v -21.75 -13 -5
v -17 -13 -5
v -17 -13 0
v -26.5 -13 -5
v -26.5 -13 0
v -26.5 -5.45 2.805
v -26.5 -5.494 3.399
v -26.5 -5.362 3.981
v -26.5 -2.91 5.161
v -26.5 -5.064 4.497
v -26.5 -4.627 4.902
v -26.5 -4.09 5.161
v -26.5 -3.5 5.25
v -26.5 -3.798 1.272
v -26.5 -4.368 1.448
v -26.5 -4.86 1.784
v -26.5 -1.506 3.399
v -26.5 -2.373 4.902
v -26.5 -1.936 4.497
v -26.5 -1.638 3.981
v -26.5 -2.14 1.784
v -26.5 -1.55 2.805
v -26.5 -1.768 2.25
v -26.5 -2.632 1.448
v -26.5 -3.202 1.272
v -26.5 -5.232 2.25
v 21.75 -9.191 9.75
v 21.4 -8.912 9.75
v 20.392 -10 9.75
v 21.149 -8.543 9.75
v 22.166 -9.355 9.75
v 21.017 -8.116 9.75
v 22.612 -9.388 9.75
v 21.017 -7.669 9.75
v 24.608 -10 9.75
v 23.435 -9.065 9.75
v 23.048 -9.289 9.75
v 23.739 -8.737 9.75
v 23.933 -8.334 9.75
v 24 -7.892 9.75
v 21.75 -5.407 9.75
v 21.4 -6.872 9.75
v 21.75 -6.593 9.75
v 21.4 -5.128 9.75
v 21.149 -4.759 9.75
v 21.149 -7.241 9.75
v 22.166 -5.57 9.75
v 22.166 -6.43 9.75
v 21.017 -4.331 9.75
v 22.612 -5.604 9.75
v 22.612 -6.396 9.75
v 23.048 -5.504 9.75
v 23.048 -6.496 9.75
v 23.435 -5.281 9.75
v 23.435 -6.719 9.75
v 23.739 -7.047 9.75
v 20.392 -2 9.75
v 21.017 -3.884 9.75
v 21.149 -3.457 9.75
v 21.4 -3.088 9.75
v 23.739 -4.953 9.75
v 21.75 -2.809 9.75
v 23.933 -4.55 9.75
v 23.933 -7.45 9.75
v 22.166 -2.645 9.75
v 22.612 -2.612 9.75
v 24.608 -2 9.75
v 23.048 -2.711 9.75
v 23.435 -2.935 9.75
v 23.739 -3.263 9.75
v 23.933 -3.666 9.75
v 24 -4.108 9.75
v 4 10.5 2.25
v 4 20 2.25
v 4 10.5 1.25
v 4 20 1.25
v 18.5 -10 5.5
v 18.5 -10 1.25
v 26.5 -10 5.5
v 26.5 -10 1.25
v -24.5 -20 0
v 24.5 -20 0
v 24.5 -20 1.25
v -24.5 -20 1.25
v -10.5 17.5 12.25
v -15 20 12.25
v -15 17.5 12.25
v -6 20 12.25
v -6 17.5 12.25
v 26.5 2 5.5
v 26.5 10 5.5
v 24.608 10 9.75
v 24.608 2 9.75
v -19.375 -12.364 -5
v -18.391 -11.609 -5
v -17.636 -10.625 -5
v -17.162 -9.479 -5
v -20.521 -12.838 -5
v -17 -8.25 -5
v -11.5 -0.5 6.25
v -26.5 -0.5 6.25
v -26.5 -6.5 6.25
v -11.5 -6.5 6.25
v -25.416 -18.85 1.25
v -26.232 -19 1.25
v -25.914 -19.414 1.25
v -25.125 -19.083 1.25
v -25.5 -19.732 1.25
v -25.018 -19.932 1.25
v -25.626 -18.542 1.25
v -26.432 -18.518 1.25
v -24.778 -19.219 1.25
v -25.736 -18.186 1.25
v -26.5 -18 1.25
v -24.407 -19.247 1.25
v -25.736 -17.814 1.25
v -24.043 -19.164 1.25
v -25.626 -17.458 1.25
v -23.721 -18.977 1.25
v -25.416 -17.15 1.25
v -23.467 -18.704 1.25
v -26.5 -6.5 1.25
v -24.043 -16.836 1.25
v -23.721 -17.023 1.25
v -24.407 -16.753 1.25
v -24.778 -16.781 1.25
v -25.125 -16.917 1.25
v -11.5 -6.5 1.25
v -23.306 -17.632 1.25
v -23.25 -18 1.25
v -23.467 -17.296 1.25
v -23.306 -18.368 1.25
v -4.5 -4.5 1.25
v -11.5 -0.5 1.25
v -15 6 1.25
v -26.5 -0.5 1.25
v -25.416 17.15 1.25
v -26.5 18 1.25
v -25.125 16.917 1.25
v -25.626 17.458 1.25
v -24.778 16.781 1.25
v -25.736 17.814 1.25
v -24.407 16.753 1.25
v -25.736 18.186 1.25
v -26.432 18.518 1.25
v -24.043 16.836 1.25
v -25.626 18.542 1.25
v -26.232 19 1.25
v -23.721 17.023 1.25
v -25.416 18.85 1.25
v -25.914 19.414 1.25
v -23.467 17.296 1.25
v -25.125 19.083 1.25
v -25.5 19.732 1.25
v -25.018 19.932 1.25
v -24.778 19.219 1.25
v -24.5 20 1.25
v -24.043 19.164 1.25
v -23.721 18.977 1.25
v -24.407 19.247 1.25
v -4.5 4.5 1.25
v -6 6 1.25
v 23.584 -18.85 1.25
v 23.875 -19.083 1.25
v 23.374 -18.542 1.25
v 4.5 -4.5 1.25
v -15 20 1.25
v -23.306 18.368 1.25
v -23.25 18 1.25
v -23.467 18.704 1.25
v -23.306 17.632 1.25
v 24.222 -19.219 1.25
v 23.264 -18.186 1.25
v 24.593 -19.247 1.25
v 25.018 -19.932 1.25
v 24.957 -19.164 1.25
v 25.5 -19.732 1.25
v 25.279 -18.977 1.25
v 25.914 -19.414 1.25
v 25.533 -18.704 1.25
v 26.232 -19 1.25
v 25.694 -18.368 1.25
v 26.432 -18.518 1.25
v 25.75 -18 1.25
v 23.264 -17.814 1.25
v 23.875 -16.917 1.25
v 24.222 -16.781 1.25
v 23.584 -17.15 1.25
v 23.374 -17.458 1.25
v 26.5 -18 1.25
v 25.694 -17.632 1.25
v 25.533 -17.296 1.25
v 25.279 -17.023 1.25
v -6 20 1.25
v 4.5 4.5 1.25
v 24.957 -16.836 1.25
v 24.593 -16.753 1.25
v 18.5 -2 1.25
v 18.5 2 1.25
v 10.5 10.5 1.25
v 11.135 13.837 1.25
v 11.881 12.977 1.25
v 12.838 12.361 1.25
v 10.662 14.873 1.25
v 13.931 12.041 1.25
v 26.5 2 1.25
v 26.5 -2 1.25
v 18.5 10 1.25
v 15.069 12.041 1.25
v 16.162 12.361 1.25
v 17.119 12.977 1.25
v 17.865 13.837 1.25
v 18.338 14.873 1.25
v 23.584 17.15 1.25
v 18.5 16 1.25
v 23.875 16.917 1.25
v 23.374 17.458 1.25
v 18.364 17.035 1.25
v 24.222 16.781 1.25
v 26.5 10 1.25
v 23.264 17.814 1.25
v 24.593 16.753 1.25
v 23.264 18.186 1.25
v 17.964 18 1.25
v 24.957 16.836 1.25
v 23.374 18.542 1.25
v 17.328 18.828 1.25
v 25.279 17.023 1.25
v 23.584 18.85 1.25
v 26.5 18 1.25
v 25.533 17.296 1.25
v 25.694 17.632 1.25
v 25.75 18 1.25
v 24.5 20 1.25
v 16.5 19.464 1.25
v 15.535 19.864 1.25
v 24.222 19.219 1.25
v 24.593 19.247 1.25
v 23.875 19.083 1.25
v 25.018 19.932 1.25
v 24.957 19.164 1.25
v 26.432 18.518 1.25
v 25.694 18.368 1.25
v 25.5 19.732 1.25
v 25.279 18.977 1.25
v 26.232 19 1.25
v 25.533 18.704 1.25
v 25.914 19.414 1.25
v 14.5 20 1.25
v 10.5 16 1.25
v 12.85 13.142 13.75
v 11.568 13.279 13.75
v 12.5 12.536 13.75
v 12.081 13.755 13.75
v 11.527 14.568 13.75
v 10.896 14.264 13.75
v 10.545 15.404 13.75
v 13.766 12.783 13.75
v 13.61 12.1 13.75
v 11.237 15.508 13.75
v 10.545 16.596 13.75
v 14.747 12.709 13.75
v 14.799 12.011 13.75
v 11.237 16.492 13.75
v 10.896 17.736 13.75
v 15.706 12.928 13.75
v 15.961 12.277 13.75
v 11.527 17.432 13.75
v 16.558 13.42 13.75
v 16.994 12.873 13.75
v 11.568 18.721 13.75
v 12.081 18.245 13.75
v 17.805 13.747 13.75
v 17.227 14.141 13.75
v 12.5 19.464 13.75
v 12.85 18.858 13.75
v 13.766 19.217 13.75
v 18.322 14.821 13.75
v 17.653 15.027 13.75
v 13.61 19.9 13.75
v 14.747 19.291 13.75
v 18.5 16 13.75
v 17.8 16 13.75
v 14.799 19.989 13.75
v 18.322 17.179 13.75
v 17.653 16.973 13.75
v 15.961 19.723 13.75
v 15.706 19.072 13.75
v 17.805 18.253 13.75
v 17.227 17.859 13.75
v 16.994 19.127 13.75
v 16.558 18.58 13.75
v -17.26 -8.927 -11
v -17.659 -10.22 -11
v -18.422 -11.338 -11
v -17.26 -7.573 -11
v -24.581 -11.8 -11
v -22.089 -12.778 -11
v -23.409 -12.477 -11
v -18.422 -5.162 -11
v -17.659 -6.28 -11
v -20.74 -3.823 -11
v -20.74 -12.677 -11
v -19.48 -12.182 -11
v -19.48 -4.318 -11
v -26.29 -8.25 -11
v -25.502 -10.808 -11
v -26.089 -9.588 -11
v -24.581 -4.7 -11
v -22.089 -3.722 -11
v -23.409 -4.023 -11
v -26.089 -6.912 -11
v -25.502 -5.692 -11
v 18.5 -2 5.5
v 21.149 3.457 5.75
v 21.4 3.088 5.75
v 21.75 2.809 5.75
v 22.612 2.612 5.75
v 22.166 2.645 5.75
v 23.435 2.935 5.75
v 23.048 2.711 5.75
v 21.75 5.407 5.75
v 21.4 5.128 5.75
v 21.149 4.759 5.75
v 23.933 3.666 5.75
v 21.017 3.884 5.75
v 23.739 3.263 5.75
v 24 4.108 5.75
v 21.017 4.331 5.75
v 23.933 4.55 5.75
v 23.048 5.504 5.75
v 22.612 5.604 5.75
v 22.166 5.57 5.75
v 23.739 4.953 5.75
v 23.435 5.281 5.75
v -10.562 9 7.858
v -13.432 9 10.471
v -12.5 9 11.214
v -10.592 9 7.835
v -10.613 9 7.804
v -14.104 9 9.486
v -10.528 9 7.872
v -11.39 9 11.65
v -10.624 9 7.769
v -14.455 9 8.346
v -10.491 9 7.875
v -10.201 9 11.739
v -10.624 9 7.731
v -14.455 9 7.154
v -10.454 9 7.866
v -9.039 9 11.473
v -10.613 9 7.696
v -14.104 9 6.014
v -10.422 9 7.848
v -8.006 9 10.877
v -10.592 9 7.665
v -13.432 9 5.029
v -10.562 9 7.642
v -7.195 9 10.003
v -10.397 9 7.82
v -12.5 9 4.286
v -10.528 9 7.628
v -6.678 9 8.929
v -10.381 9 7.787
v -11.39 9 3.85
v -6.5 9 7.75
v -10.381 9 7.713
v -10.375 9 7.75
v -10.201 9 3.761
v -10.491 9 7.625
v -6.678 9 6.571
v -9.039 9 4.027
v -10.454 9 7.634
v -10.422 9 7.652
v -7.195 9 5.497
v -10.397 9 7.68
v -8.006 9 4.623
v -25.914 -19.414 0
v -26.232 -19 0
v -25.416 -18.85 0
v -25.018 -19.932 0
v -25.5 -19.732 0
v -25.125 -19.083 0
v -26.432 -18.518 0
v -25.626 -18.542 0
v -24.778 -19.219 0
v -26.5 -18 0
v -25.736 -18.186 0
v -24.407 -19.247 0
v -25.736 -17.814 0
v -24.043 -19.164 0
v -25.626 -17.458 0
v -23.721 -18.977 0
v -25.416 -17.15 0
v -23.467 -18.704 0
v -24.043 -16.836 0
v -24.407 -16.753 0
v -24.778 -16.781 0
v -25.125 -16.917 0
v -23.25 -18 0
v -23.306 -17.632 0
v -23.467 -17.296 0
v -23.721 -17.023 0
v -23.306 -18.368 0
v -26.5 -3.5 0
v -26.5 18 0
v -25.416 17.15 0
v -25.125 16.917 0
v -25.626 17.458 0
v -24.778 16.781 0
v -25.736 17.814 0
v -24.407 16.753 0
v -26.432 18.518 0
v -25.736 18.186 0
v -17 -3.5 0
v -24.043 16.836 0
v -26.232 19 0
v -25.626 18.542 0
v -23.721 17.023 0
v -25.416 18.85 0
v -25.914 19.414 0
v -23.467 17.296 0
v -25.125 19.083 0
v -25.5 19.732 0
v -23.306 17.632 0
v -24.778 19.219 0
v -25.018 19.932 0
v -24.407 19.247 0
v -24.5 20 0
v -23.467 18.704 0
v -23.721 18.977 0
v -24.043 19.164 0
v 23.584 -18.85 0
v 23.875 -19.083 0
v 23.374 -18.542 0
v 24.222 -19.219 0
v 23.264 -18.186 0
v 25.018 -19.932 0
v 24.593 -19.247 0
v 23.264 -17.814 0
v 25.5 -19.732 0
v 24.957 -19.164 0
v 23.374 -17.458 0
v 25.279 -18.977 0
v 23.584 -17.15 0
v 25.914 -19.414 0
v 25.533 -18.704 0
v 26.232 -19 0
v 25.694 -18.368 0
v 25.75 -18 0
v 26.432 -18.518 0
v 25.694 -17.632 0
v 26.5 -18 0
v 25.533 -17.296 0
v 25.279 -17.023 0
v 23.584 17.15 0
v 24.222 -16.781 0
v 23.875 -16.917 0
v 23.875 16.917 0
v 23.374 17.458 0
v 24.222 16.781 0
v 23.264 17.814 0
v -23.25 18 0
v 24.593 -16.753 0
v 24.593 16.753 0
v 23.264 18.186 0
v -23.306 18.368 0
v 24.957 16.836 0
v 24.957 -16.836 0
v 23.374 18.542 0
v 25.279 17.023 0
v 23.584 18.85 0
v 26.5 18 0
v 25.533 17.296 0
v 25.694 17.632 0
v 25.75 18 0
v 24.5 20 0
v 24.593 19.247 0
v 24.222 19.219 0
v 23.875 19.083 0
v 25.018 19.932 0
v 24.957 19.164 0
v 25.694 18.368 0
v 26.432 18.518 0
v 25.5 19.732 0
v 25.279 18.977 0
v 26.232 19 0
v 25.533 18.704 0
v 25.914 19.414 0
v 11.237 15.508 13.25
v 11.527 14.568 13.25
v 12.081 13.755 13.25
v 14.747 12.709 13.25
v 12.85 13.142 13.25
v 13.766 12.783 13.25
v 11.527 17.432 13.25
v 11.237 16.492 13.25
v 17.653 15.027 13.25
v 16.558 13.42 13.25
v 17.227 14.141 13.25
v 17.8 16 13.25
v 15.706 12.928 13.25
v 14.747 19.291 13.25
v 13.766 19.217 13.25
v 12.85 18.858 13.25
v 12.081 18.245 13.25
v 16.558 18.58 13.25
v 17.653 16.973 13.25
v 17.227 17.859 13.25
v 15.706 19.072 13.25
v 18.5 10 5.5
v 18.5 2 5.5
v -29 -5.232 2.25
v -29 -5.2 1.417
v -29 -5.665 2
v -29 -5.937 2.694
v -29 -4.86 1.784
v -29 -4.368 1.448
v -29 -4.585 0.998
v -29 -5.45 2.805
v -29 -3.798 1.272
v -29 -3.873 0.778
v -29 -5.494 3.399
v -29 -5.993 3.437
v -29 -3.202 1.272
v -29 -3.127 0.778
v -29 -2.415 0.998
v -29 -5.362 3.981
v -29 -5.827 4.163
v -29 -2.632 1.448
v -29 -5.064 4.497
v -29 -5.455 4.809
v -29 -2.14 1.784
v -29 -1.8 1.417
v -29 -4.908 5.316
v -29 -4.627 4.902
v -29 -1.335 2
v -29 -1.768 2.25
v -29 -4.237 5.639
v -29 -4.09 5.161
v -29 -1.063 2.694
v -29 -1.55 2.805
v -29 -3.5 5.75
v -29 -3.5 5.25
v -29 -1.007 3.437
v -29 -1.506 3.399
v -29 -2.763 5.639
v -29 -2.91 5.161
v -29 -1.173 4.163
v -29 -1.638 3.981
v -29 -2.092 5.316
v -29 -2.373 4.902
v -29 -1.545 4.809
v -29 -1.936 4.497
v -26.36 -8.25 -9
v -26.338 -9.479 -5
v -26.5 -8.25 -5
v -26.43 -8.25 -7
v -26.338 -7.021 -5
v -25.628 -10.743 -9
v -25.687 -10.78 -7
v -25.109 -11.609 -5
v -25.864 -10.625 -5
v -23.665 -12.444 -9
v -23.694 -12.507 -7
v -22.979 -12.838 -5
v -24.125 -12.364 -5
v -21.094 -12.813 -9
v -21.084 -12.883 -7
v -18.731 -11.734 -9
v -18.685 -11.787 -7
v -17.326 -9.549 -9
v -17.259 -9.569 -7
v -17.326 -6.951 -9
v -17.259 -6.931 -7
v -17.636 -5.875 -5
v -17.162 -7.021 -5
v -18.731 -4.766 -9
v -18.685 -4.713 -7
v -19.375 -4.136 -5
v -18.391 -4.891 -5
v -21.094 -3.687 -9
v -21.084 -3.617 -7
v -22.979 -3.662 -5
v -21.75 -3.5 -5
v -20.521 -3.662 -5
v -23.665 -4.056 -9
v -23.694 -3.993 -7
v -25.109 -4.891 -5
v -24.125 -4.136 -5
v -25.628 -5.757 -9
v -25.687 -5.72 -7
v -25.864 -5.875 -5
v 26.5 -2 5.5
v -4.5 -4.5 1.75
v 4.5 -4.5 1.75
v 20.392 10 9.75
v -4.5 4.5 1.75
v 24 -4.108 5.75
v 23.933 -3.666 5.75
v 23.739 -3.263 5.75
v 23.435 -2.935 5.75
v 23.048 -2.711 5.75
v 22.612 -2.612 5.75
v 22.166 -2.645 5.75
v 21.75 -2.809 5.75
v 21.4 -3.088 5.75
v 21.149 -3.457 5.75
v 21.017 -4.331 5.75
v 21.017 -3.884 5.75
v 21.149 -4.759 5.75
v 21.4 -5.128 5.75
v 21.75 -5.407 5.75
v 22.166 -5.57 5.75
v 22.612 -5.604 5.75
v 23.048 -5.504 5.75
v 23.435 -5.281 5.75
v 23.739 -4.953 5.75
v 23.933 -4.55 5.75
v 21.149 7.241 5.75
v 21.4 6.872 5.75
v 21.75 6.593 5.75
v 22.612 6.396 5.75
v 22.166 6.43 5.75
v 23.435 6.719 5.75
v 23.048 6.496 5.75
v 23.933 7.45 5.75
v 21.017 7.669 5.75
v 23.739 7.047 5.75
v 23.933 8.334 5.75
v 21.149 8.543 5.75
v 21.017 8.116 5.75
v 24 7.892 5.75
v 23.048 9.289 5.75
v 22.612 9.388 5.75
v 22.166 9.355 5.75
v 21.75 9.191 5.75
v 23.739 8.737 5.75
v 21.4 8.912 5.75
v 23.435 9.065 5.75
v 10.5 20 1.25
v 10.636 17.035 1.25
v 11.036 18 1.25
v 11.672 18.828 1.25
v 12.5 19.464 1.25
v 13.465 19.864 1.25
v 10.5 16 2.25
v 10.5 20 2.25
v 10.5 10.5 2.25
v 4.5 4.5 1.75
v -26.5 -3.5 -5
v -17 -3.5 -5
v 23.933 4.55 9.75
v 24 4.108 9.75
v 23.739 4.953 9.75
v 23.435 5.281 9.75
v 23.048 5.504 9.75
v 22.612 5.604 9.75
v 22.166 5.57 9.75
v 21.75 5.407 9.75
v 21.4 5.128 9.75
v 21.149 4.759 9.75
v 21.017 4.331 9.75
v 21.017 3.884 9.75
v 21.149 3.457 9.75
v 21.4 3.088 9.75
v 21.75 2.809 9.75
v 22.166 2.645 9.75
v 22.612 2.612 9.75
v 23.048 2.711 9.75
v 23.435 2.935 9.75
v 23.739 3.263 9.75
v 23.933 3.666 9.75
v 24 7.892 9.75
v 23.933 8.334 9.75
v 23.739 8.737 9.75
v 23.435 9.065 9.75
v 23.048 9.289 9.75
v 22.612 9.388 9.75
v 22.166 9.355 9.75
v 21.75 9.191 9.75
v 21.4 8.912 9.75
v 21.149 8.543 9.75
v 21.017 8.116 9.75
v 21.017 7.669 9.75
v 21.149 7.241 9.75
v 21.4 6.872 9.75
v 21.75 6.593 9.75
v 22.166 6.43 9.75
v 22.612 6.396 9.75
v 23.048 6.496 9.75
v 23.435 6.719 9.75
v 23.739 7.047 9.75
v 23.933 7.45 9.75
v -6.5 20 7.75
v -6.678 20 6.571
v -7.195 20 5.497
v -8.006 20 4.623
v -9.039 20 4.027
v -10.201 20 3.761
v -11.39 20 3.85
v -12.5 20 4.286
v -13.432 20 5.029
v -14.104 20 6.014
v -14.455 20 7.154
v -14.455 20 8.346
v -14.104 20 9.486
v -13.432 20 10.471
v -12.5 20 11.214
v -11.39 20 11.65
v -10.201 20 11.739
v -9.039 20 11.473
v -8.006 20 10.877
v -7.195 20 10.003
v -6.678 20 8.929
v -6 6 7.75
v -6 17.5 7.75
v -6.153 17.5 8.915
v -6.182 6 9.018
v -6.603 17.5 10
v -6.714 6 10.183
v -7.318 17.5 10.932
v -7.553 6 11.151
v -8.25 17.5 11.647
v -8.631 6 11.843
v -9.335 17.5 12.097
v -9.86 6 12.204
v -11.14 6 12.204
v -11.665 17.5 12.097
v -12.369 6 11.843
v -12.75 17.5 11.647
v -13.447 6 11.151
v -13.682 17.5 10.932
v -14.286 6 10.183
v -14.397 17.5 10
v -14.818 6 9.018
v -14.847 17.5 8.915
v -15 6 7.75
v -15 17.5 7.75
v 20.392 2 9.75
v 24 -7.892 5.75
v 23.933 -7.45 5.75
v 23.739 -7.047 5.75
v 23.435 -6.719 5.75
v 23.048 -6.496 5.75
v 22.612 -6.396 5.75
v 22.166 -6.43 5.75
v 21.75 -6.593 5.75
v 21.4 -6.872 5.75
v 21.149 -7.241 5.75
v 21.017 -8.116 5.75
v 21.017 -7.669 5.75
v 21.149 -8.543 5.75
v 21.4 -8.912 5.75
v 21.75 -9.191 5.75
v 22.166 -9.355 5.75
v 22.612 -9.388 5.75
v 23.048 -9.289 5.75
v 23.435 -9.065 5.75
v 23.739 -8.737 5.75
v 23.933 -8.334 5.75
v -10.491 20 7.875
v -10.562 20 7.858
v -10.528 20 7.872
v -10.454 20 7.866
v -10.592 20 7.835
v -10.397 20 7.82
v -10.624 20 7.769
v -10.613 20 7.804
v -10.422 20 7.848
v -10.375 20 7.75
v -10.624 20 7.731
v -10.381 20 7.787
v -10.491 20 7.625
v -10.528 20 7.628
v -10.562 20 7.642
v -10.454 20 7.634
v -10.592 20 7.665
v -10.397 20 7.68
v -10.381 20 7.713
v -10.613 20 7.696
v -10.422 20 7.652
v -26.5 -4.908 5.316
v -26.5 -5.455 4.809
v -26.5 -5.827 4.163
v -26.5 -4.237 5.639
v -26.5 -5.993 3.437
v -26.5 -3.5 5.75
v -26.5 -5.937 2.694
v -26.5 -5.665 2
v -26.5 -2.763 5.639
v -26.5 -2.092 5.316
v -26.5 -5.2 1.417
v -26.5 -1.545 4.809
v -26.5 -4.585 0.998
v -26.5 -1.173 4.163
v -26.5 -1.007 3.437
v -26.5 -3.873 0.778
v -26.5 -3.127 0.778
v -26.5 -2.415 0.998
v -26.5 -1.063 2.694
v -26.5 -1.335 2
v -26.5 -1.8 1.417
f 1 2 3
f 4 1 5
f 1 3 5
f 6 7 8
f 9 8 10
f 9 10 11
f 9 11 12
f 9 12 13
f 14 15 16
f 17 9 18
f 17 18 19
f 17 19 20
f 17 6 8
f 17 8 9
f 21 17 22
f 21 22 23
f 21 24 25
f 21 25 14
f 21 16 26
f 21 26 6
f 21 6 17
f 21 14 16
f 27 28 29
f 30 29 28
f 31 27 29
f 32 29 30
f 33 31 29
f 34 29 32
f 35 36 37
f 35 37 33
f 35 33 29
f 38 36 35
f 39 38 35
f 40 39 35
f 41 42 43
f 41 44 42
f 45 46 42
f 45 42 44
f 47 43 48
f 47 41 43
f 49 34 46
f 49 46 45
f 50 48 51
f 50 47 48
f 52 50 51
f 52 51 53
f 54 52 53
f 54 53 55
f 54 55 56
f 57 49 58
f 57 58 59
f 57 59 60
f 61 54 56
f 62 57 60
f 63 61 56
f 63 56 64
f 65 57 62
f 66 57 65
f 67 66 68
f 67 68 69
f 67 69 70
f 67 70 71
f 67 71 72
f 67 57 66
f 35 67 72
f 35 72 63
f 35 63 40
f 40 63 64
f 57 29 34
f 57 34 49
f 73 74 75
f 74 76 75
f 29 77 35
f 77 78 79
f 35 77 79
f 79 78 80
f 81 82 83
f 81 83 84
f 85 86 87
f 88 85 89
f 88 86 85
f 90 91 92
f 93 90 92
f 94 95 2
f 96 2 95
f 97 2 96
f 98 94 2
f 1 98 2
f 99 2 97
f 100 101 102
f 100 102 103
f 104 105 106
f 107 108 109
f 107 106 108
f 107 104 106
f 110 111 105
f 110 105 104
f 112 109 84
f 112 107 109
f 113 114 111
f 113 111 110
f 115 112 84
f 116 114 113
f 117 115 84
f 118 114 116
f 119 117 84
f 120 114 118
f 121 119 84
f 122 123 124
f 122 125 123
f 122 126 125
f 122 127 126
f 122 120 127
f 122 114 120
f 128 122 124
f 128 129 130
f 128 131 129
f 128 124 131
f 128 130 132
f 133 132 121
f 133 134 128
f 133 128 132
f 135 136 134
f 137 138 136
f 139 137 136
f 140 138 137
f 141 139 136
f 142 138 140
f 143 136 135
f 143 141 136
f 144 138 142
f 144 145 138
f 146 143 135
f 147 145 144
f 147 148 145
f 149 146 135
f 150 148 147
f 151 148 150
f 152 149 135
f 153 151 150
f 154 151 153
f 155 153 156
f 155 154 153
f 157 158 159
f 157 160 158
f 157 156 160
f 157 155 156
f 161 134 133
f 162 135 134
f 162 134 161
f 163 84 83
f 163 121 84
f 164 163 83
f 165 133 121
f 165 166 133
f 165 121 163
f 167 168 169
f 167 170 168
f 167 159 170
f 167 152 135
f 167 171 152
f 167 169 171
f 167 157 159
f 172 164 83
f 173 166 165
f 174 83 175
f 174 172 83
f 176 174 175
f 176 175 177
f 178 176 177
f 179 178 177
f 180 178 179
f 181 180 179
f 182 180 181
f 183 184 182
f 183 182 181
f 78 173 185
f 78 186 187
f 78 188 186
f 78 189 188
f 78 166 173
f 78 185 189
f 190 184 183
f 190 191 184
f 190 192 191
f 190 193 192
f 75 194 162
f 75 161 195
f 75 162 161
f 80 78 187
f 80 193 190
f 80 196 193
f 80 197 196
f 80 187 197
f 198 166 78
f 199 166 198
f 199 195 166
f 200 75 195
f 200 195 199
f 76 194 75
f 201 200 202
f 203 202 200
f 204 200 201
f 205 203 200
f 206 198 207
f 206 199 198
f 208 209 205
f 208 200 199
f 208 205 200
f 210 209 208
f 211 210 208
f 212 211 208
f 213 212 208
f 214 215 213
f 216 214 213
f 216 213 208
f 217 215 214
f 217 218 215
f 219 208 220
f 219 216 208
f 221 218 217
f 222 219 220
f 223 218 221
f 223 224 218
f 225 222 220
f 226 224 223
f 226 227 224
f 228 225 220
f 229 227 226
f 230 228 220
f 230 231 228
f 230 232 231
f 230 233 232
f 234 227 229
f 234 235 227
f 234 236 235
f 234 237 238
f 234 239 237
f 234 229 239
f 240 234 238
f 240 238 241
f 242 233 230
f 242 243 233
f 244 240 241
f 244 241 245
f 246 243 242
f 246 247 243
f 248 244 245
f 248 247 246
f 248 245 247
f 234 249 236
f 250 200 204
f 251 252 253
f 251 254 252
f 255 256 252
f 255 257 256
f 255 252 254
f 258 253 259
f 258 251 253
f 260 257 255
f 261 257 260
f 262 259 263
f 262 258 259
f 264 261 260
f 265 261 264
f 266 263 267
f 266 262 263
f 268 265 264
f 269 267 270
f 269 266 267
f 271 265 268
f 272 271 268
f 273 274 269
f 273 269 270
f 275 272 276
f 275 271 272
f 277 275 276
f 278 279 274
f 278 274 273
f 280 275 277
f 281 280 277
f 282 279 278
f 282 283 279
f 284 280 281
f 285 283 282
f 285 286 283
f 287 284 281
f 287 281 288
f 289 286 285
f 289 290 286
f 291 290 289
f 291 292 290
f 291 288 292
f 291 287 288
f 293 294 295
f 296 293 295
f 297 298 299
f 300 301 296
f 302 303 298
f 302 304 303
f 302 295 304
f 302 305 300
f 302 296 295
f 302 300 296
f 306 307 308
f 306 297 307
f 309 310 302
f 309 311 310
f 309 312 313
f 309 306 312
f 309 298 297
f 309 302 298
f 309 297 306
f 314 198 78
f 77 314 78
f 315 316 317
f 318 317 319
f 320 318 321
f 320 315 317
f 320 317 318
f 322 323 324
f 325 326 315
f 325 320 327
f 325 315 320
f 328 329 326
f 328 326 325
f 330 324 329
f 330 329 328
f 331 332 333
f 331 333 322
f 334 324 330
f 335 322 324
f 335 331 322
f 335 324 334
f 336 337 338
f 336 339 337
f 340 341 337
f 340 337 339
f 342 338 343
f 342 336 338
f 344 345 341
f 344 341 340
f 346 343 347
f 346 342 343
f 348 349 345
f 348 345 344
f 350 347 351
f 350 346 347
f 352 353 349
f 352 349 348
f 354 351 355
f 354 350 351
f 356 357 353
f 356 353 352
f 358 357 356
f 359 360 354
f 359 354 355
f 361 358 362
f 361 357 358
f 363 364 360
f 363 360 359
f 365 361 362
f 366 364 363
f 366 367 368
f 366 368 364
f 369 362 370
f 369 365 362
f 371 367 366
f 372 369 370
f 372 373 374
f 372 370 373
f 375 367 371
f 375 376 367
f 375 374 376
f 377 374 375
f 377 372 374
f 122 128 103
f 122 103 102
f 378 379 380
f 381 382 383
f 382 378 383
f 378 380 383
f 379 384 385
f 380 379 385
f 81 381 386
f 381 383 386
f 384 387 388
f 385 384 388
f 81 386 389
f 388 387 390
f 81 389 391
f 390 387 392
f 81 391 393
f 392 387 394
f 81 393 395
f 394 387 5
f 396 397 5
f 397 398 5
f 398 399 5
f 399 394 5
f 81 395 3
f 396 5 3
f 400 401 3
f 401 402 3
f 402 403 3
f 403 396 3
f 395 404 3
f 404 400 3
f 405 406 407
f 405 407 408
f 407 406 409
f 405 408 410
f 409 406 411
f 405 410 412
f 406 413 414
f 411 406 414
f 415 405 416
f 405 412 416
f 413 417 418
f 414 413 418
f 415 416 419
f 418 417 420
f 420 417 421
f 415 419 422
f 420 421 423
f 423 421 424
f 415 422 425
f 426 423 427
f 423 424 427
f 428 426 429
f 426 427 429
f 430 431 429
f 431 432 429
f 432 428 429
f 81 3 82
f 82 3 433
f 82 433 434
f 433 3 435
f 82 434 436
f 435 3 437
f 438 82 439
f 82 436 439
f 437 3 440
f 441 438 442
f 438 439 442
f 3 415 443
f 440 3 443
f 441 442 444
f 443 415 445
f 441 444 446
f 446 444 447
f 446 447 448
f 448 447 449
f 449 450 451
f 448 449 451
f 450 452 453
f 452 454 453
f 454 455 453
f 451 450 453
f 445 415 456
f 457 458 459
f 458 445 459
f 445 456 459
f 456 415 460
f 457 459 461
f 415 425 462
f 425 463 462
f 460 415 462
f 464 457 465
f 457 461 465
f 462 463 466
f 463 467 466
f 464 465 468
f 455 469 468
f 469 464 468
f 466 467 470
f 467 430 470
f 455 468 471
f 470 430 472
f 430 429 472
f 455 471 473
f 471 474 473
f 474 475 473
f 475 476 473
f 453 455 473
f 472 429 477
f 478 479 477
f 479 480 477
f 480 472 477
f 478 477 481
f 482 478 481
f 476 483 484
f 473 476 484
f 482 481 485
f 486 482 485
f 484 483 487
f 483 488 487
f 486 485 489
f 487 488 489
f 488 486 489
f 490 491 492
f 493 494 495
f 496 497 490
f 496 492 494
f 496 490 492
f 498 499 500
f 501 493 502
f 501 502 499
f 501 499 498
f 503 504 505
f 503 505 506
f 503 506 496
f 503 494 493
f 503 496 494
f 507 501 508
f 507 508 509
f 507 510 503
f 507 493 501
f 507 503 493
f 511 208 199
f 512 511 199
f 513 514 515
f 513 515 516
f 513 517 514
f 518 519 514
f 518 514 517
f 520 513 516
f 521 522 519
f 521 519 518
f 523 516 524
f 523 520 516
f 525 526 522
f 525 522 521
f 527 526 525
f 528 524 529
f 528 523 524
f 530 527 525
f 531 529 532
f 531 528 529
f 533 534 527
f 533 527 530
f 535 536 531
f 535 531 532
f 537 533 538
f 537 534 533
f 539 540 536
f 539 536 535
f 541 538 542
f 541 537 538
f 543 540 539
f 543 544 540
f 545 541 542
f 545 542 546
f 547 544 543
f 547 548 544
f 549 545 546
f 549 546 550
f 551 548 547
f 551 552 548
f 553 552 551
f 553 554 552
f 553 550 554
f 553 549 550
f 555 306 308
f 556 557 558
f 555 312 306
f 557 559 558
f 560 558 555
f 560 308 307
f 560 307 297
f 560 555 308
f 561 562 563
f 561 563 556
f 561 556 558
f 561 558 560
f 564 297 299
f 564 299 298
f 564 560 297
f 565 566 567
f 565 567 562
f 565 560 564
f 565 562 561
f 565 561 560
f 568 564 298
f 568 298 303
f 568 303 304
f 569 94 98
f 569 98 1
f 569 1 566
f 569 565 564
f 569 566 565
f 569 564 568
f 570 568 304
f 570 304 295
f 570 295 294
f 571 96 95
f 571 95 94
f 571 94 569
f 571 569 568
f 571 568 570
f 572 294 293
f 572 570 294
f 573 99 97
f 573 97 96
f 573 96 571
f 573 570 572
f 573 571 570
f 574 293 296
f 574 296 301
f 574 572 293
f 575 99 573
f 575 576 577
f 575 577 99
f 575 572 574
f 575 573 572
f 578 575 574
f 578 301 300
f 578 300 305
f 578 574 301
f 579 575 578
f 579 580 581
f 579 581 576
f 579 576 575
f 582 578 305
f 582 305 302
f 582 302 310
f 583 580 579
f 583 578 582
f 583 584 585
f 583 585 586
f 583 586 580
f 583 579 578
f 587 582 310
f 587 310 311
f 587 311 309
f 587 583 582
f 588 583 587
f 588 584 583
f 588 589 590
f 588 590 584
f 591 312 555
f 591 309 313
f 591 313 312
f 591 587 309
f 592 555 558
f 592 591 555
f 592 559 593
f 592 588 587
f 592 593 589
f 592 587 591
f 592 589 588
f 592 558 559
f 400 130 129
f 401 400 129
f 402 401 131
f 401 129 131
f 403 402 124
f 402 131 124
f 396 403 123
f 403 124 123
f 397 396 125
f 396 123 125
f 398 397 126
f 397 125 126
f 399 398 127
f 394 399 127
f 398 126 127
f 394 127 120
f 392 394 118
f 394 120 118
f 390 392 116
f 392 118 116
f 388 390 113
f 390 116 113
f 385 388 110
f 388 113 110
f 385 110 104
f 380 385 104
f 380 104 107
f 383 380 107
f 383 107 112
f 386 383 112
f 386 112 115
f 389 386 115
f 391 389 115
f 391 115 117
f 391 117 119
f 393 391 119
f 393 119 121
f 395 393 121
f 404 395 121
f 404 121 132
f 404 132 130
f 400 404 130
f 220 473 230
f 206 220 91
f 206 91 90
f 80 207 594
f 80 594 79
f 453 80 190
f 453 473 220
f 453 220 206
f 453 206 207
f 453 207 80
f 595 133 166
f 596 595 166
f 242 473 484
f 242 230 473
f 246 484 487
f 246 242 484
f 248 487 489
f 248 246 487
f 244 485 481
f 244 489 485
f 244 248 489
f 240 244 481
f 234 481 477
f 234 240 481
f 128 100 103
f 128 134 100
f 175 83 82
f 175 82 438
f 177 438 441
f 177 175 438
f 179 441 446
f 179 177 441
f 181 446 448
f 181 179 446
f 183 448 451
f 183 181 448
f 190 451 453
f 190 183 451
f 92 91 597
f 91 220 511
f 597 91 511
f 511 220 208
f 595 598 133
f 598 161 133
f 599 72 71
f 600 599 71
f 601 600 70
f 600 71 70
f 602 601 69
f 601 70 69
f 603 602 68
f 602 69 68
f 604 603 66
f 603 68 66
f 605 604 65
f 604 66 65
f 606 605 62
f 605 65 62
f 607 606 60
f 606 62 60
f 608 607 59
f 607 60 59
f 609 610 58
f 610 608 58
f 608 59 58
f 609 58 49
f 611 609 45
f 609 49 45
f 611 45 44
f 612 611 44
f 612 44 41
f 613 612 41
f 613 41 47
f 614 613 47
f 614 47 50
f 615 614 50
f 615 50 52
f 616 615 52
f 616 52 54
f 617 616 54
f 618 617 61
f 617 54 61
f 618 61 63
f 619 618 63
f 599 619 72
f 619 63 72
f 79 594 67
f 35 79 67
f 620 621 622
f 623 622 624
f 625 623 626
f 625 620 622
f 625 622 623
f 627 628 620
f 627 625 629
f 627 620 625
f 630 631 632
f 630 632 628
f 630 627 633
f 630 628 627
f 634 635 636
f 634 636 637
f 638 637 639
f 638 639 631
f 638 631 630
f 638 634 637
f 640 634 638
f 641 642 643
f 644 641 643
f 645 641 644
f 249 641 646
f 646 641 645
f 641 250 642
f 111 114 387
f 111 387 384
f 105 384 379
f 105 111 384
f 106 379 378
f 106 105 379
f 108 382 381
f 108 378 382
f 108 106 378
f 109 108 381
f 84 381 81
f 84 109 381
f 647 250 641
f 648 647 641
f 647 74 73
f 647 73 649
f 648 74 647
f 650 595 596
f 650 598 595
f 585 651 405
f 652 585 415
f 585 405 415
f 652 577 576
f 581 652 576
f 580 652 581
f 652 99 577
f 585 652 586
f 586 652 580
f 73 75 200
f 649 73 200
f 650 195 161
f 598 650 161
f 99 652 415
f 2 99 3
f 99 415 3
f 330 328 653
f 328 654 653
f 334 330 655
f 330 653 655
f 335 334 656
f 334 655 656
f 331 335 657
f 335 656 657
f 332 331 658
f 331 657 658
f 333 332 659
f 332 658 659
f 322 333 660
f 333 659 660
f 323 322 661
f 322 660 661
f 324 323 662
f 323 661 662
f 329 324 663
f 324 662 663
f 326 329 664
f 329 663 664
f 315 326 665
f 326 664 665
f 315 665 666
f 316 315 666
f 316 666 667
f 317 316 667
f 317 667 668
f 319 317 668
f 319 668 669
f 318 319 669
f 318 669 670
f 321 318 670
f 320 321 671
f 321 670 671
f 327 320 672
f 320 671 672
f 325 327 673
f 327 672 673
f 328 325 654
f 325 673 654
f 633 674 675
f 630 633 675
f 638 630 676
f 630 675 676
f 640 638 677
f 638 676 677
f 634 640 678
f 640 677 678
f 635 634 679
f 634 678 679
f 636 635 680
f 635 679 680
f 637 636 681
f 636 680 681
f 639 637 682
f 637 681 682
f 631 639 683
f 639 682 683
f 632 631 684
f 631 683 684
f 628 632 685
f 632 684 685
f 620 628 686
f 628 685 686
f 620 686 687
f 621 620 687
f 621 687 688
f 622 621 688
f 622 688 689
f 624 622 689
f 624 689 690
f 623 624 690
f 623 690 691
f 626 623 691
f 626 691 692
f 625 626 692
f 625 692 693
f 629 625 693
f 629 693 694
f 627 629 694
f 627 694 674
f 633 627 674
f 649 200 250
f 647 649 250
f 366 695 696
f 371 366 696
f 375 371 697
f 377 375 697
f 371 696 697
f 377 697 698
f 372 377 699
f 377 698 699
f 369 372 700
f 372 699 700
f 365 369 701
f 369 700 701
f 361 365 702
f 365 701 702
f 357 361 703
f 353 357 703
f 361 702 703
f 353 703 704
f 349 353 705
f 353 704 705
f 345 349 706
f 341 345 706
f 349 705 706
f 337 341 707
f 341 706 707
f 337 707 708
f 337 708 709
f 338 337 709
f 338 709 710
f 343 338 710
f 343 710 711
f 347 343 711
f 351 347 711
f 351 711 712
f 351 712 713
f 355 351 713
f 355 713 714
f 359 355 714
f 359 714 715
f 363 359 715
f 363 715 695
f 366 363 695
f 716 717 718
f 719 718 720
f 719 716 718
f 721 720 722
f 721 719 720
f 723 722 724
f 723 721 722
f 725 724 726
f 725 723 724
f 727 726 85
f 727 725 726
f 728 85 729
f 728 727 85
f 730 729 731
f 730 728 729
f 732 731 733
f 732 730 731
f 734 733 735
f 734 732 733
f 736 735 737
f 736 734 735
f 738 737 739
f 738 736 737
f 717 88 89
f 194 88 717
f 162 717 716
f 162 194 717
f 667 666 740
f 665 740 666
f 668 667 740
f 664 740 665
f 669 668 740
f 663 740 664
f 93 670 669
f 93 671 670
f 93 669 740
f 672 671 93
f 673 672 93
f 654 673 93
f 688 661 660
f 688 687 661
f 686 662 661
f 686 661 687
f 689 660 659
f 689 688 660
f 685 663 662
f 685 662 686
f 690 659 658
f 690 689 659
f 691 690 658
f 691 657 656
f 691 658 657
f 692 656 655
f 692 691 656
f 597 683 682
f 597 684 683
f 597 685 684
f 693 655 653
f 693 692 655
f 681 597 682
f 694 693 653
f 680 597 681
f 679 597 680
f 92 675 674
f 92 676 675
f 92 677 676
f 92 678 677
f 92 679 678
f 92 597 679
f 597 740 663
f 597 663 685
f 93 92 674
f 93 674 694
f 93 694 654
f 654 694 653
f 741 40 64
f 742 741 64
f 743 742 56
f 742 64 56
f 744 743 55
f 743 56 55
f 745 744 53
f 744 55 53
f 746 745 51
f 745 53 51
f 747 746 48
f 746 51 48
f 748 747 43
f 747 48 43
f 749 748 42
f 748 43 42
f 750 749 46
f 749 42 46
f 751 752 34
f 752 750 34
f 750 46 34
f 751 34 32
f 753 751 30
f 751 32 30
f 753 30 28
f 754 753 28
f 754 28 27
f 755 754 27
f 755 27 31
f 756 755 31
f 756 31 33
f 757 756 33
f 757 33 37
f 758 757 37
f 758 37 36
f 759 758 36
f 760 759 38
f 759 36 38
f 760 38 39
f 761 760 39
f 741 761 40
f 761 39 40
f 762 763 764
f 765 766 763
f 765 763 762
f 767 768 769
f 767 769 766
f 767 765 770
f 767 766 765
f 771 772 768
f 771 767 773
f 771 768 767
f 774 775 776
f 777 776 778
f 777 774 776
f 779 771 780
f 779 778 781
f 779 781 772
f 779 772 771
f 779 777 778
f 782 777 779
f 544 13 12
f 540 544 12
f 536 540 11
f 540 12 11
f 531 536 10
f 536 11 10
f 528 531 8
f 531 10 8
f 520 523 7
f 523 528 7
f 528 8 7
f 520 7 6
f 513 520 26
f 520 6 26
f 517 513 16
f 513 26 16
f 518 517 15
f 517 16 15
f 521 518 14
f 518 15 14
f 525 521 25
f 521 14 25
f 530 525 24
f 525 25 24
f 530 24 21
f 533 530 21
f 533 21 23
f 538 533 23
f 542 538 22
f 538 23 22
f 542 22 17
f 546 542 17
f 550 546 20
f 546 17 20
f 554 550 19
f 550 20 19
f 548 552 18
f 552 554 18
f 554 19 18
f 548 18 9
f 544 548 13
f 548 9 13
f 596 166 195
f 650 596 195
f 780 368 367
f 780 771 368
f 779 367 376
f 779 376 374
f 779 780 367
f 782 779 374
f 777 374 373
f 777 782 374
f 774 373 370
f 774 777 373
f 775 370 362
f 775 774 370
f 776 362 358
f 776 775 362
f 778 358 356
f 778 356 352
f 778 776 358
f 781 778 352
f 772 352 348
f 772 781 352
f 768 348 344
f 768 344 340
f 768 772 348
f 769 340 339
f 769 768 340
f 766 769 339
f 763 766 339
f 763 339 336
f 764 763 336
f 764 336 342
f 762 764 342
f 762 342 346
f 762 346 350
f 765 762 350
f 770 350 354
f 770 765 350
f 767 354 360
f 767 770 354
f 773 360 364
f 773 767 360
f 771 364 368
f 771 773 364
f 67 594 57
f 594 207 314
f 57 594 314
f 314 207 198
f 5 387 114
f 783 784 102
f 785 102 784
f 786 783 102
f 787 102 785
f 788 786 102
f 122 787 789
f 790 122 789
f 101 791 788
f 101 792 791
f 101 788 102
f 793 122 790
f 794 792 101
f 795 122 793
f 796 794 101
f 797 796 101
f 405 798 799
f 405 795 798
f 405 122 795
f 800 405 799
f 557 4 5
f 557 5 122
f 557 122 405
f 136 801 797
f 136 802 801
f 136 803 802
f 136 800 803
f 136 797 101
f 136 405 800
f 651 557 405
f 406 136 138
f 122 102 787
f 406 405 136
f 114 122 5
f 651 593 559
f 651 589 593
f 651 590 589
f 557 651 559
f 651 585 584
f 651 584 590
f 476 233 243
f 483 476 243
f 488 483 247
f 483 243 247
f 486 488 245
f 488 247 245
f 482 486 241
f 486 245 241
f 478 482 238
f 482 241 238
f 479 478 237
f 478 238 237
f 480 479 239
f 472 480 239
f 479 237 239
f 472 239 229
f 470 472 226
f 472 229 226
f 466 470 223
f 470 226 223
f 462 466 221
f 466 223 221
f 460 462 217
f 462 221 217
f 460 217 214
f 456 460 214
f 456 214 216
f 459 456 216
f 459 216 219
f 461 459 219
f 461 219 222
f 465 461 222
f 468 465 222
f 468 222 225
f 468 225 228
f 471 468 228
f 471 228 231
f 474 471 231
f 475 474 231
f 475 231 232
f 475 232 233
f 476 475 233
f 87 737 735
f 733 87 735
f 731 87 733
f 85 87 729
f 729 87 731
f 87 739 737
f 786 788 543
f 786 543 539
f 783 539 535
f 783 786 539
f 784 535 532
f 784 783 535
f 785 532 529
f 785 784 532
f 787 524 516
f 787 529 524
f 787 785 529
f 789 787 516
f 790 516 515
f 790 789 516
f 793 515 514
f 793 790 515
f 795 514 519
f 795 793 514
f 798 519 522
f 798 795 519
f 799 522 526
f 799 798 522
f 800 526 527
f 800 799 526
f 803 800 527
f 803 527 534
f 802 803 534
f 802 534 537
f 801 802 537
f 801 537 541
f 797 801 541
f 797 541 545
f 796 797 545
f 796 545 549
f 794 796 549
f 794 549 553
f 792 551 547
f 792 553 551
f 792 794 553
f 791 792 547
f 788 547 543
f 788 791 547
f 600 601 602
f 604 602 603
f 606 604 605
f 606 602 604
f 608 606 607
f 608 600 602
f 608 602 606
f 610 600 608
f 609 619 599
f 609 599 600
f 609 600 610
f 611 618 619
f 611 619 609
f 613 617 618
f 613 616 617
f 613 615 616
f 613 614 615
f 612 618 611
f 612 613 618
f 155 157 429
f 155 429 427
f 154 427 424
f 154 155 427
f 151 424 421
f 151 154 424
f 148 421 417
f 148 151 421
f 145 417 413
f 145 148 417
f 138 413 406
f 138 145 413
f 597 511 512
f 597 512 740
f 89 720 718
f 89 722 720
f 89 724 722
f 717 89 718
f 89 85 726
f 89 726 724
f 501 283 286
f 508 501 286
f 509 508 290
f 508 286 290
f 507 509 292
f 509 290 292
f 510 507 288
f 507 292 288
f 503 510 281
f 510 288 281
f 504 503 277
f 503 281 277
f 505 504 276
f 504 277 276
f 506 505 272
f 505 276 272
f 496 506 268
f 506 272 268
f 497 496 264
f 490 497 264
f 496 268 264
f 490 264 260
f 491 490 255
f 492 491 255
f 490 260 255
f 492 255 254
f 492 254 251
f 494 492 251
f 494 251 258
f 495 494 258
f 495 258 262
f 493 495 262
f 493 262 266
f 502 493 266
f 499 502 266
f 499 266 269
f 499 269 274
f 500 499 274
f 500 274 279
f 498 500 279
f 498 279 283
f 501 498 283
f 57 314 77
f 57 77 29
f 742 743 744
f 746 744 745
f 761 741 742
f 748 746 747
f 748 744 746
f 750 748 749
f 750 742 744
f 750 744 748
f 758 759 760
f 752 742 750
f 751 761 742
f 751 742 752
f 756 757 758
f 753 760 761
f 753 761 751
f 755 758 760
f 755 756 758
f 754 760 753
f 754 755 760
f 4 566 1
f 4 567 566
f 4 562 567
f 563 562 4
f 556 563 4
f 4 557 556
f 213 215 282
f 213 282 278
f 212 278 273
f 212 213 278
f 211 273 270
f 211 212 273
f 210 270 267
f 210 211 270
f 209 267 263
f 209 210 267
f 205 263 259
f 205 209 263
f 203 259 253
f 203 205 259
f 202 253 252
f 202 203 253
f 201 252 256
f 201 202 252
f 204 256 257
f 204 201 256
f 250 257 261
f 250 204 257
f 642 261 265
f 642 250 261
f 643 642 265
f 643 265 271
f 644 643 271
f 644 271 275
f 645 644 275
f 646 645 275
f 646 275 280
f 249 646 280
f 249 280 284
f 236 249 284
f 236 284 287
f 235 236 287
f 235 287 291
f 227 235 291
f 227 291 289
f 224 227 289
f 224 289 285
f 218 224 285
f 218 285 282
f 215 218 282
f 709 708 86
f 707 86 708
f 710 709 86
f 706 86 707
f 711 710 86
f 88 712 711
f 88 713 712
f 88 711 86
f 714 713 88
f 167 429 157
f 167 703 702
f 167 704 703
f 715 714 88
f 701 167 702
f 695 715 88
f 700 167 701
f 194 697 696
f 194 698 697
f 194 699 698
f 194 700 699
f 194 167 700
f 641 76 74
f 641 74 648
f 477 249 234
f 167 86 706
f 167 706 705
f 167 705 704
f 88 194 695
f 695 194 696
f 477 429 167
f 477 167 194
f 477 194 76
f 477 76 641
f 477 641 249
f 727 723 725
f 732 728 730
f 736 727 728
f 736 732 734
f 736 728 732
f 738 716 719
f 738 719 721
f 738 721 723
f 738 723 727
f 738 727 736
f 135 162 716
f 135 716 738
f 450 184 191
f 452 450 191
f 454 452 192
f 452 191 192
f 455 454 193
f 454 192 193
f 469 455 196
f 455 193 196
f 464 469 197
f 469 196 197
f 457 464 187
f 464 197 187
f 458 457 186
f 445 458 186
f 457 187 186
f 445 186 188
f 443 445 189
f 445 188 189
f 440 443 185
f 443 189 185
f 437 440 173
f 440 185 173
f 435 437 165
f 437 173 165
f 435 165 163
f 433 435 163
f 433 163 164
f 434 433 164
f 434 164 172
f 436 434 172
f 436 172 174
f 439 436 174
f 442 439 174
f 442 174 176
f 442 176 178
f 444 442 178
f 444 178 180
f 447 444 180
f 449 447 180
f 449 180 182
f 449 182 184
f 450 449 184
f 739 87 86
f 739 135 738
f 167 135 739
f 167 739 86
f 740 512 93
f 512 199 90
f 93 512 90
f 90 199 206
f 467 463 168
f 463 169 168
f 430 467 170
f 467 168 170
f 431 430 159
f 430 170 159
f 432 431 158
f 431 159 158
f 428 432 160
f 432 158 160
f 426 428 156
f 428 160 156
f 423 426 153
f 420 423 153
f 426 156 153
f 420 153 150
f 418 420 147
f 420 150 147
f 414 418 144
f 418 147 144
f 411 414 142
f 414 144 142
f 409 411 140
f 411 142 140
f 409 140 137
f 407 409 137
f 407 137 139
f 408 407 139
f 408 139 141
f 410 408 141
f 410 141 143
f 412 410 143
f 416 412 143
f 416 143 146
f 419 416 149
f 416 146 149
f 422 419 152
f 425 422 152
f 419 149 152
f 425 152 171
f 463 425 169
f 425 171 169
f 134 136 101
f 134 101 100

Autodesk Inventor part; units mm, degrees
ref_plane "YZ Plane" through (0, 0, 0) normal (1, 0, 0) x (0, 1, 0)
ref_plane "XZ Plane" through (0, 0, 0) normal (0, 1, 0) x (-1, 0, 0)
ref_plane "XY Plane" through (0, 0, 0) normal (0, 0, 1) x (1, 0, 0)
sketch "Base" plane through (0, 0, 0) normal (0, 0, 1) x (1, 0, 0)
  line L0 (26.5, -20) -> (-26.5, -20)
  line L1 (-26.5, -20) -> (-26.5, 20)
  line L2 (-26.5, 20) -> (26.5, 20)
  line L3 (26.5, 20) -> (26.5, -20)
  line L4 (26.5, -20) -> (-26.5, 20) construction
  line L5 (-26.5, -20) -> (26.5, 20) construction
  point P0 (0, 0)
  dimension "d0" = 53
  dimension "d1" = 40
extrude "BaseFeature" add sketch "Base" along normal blind 1.25
fillet "BaseFilletFeature" radius 2 4 edges at (-26.5, 20, 0.625) (26.5, 20, 0.625) (-26.5, -20, 0.625) (26.5, -20, 0.625)
sketch "MountHoles" plane through (0, 0, 1.25) normal (0, 0, 1) x (1, 0, 0)
  arc A0 (-24.5, 20) -> (-26.5, 18) centre (-24.5, 18) ccw projected
  arc A1 (26.5, 18) -> (24.5, 20) centre (24.5, 18) ccw projected
  arc A2 (-26.5, -18) -> (-24.5, -20) centre (-24.5, -18) ccw projected
  arc A3 (24.5, -20) -> (26.5, -18) centre (24.5, -18) ccw projected
  circle A4 centre (-24.5, 18) radius 1.25
  circle A5 centre (24.5, 18) radius 1.25
  circle A6 centre (-24.5, -18) radius 1.25
  circle A7 centre (24.5, -18) radius 1.25
  point P0 (0, 0)
  dimension "d5" = 2.5
extrude "MountHolesFeature" cut sketch "MountHoles" against normal through all
sketch "Sketch3" plane through (0, 0, 1.25) normal (0, 0, 1) x (1, 0, 0)
  line L0 (26.5, 10) -> (18.5, 10)
  line L1 (18.5, 10) -> (18.5, 2)
  line L2 (18.5, 2) -> (26.5, 2)
  line L3 (26.5, 2) -> (26.5, 10)
  line L4 (26.5, -2) -> (18.5, -2)
  line L5 (18.5, -2) -> (18.5, -10)
  line L6 (18.5, -10) -> (26.5, -10)
  line L7 (26.5, -10) -> (26.5, -2)
  line L8 (24.5, 20) -> (-24.5, 20) projected
  line L9 (-24.5, -20) -> (24.5, -20) projected
  line L10 (26.5, -18) -> (26.5, 18) projected
  point P0 (0, 0)
  point P1 (22.5, 10)
  dimension "d8" = 10
  dimension "d9" = 8
  dimension "d10" = 10
  dimension "d11" = 8
extrude "Extrusion3" add sketch "Sketch3" along normal blind 8.5
sketch "Sketch4" plane through (18.5, -10, 1.25) normal (0, -1, 0) x (1, 0, 0)
  line L0 (0, 0) -> (0, 8.5) projected
  line L1 (0, 4.25) -> (8, 4.25)
  line L2 (8, 0) -> (8, 8.5) projected
  line L3 (0, 4.25) -> (1.8922, 8.5)
  line L4 (0, 8.5) -> (8, 8.5) projected
  line L5 (8, 4.25) -> (6.1078, 8.5)
  point P0 (-18.5, -1.25)
  dimension "d14" = 24
  dimension "d15" = 24
extrude "Extrusion4" cut sketch "Sketch4" along normal through all both and the other way through all contours L0 L4 L3 | L5 L4 L2
sketch "Sketch5" plane through (0, 0, 9.75) normal (0, 0, 1) x (1, 0, 0)
  line L0 (20.3922, 10) -> (20.3922, 2) construction
  line L1 (20.3922, 6) -> (24.6078, 6) construction
  line L2 (24.6078, 2) -> (24.6078, 10) construction
  circle A0 centre (22.5, 7.8922) radius 2.1078 construction
  line L3 (24.6078, 10) -> (20.3922, 10) construction
  circle A1 centre (22.5, 4.1078) radius 2.1078 construction
  line L4 (20.3922, 2) -> (24.6078, 2) construction
  circle A2 centre (22.5, 7.8922) radius 1.5
  circle A3 centre (22.5, 4.1078) radius 1.5
  point P0 (0, 0)
  dimension "d18" = 3
  dimension "d19" = 3
extrude "Extrusion5" cut sketch "Sketch5" against normal blind 4
mirror "Mirror1" about plane through (0, 0, 0) normal (0, 1, 0) of "Extrusion5"
sketch "Sketch6" plane through (0, 0, 1.25) normal (0, 0, 1) x (1, 0, 0)
  circle A0 centre (14.5, 16) radius 4
  line L0 (24.5, 20) -> (-24.5, 20) projected
  line L1 (10.5, 20) -> (18.5, 20)
  line L2 (18.5, 20) -> (18.5, 12) construction
  line L3 (18.5, 12) -> (10.5, 12) construction
  line L4 (10.5, 12) -> (10.5, 20) construction
  line L5 (26.5, 10) -> (26.5, 18) projected
  point P0 (0, 0)
  dimension "d22" = 8
  dimension "d23" = 8
extrude "Extrusion6" add sketch "Sketch6" along normal blind 12.5
sketch "Sketch7" plane through (14.5, 16, 13.75) normal (0, 0, 1) x (1, 0, 0)
  circle A0 centre (0, 0) radius 4 projected
  circle A1 centre (0, 0) radius 3.3
  point P0 (-14.5, -16)
  dimension "d26" = 0.7
extrude "Extrusion7" cut sketch "Sketch7" against normal blind 0.5 contours A1
sketch "Sketch8" plane through (0, 0, 1.25) normal (0, 0, 1) x (1, 0, 0)
  line L0 (-26.5, 18) -> (-26.5, -18) projected
  line L1 (-26.5, -0.5) -> (-11.5, -0.5)
  line L2 (-11.5, -0.5) -> (-11.5, -6.5)
  line L3 (-11.5, -6.5) -> (-26.5, -6.5)
  line L4 (-26.5, -6.5) -> (-26.5, -0.5)
  line L5 (-24.5, -20) -> (24.5, -20) projected
  point P0 (0, 0)
  dimension "d29" = 15
  dimension "d30" = 6
  dimension "d31" = 13.5
extrude "Extrusion8" add sketch "Sketch8" along normal blind 5
sketch "Sketch9" plane through (-26.5, -18, 0) normal (-1, 0, 0) x (0, 0, 1)
  line L0 (1.25, 17.5) -> (6.25, 17.5) construction
  line L1 (6.25, 17.5) -> (6.25, 11.5) construction
  line L2 (1.25, 11.5) -> (6.25, 11.5) construction
  circle A0 centre (3.25, 14.5) radius 3 construction
  circle A1 centre (3.25, 14.5) radius 2.5
  circle A2 centre (3.25, 14.5) radius 2
  point P0 (0, 18)
  dimension "d34" = 0.5
  dimension "d35" = 0.5
extrude "Extrusion9" add sketch "Sketch9" along normal blind 2.5
sketch "Sketch10" plane through (0, 0, 1.25) normal (0, 0, 1) x (1, 0, 0)
  line L0 (14.5, 20) -> (-24.5, 20) projected
  line L1 (-15, 20) -> (-6, 20)
  line L2 (-6, 20) -> (-6, 6)
  line L3 (-6, 6) -> (-15, 6)
  line L4 (-15, 6) -> (-15, 20)
  line L5 (-26.5, 18) -> (-26.5, -0.5) projected
  point P0 (0, 0)
  dimension "d38" = 14
  dimension "d39" = 9
  dimension "d40" = 11.5
extrude "Extrusion10" add sketch "Sketch10" along normal blind 11
sketch "Sketch11" plane through (-24.5, 20, 0) normal (0, 1, 0) x (1, 0, 0)
  line L0 (18.5, -1.25) -> (18.5, -12.25) construction
  line L1 (18.5, -12.25) -> (9.5, -12.25) construction
  line L2 (9.5, -1.25) -> (9.5, -12.25) construction
  circle A0 centre (14, -7.75) radius 4.5
  circle A1 centre (14, -7.75) radius 4
  circle A2 centre (14, -7.75) radius 0.125
  point P0 (24.5, 0)
  dimension "d43" = 0.5
  dimension "d44" = 0.25
extrude "Extrusion11" cut sketch "Sketch11" against normal blind 11 contours A1
sketch "Sketch12" plane through (0, 0, 1.25) normal (0, 0, 1) x (1, 0, 0)
  line L0 (-4.5, -4.5) -> (4.5, -4.5)
  line L1 (4.5, -4.5) -> (4.5, 4.5)
  line L2 (4.5, 4.5) -> (-4.5, 4.5)
  line L3 (-4.5, 4.5) -> (-4.5, -4.5)
  line L4 (-4.5, -4.5) -> (4.5, 4.5) construction
  line L5 (4.5, -4.5) -> (-4.5, 4.5) construction
  point P0 (0, 0)
  dimension "d47" = 9
extrude "Extrusion12" add sketch "Sketch12" along normal blind 0.5
sketch "Sketch13" plane through (-15, 6, 1.25) normal (0, -1, 0) x (1, 0, 0)
  circle A0 centre (4.5, 6.5) radius 4 projected
  circle A1 centre (4.5, 6.5) radius 4.5
  line L0 (9, 0) -> (0, 0) projected
  line L1 (9, 0) -> (9, 11) projected
  line L2 (0, 11) -> (9, 11) projected
  line L3 (0, 0) -> (0, 11) projected
  point P0 (15, -1.25)
  point P1 (0, 6.5)
  point P2 (4.5, 11)
  point P3 (9, 6.5)
extrude "Extrusion13" cut sketch "Sketch13" against normal blind 11.5 contours A1 L2 L1 | A1 L3 L2
sketch "Sketch14" plane through (0, 0, 1.25) normal (0, 0, 1) x (1, 0, 0)
  line L0 (14.5, 20) -> (-6, 20) projected
  line L1 (10.5, 20) -> (4, 20)
  line L2 (4, 20) -> (4, 10.5)
  line L3 (4, 10.5) -> (10.5, 10.5)
  line L4 (10.5, 10.5) -> (10.5, 20)
  circle A0 centre (14.5, 16) radius 4 projected
  point P0 (0, 0)
  point P1 (4, 20)
  dimension "d52" = 6.5
  dimension "d53" = 9.5
extrude "Extrusion14" add sketch "Sketch14" along normal blind 1 contours L4 L3 L2 L0
sketch "Sketch15" plane through (0, 0, 0) normal (0, 0, -1) x (-1, 0, 0)
  line L0 (26.5, -6.5) -> (26.5, -18) projected
  line L1 (26.5, -3.5) -> (17, -3.5)
  line L2 (17, -3.5) -> (17, -13)
  line L3 (17, -13) -> (26.5, -13)
  line L4 (26.5, -13) -> (26.5, -3.5)
  line L5 (24.5, -20) -> (-24.5, -20) projected
  point P0 (0, 0)
  dimension "d56" = 9.5
  dimension "d57" = 7
extrude "Extrusion15" add sketch "Sketch15" along normal blind 5
sketch "Sketch16" plane through (0, 0, -5) normal (0, 0, -1) x (-1, 0, 0)
  line L0 (17, -13) -> (26.5, -13) projected
  line L1 (26.5, -13) -> (26.5, -3.5) projected
  line L2 (26.5, -3.5) -> (17, -3.5) projected
  line L3 (17, -3.5) -> (17, -13) projected
  circle A0 centre (21.75, -8.25) radius 4.75
  point P0 (0, 0)
extrude "Extrusion16" add sketch "Sketch16" along normal blind 6 draft -2 contours A0
properties part number "Max9744_20W_ClassD_Amplifier"
